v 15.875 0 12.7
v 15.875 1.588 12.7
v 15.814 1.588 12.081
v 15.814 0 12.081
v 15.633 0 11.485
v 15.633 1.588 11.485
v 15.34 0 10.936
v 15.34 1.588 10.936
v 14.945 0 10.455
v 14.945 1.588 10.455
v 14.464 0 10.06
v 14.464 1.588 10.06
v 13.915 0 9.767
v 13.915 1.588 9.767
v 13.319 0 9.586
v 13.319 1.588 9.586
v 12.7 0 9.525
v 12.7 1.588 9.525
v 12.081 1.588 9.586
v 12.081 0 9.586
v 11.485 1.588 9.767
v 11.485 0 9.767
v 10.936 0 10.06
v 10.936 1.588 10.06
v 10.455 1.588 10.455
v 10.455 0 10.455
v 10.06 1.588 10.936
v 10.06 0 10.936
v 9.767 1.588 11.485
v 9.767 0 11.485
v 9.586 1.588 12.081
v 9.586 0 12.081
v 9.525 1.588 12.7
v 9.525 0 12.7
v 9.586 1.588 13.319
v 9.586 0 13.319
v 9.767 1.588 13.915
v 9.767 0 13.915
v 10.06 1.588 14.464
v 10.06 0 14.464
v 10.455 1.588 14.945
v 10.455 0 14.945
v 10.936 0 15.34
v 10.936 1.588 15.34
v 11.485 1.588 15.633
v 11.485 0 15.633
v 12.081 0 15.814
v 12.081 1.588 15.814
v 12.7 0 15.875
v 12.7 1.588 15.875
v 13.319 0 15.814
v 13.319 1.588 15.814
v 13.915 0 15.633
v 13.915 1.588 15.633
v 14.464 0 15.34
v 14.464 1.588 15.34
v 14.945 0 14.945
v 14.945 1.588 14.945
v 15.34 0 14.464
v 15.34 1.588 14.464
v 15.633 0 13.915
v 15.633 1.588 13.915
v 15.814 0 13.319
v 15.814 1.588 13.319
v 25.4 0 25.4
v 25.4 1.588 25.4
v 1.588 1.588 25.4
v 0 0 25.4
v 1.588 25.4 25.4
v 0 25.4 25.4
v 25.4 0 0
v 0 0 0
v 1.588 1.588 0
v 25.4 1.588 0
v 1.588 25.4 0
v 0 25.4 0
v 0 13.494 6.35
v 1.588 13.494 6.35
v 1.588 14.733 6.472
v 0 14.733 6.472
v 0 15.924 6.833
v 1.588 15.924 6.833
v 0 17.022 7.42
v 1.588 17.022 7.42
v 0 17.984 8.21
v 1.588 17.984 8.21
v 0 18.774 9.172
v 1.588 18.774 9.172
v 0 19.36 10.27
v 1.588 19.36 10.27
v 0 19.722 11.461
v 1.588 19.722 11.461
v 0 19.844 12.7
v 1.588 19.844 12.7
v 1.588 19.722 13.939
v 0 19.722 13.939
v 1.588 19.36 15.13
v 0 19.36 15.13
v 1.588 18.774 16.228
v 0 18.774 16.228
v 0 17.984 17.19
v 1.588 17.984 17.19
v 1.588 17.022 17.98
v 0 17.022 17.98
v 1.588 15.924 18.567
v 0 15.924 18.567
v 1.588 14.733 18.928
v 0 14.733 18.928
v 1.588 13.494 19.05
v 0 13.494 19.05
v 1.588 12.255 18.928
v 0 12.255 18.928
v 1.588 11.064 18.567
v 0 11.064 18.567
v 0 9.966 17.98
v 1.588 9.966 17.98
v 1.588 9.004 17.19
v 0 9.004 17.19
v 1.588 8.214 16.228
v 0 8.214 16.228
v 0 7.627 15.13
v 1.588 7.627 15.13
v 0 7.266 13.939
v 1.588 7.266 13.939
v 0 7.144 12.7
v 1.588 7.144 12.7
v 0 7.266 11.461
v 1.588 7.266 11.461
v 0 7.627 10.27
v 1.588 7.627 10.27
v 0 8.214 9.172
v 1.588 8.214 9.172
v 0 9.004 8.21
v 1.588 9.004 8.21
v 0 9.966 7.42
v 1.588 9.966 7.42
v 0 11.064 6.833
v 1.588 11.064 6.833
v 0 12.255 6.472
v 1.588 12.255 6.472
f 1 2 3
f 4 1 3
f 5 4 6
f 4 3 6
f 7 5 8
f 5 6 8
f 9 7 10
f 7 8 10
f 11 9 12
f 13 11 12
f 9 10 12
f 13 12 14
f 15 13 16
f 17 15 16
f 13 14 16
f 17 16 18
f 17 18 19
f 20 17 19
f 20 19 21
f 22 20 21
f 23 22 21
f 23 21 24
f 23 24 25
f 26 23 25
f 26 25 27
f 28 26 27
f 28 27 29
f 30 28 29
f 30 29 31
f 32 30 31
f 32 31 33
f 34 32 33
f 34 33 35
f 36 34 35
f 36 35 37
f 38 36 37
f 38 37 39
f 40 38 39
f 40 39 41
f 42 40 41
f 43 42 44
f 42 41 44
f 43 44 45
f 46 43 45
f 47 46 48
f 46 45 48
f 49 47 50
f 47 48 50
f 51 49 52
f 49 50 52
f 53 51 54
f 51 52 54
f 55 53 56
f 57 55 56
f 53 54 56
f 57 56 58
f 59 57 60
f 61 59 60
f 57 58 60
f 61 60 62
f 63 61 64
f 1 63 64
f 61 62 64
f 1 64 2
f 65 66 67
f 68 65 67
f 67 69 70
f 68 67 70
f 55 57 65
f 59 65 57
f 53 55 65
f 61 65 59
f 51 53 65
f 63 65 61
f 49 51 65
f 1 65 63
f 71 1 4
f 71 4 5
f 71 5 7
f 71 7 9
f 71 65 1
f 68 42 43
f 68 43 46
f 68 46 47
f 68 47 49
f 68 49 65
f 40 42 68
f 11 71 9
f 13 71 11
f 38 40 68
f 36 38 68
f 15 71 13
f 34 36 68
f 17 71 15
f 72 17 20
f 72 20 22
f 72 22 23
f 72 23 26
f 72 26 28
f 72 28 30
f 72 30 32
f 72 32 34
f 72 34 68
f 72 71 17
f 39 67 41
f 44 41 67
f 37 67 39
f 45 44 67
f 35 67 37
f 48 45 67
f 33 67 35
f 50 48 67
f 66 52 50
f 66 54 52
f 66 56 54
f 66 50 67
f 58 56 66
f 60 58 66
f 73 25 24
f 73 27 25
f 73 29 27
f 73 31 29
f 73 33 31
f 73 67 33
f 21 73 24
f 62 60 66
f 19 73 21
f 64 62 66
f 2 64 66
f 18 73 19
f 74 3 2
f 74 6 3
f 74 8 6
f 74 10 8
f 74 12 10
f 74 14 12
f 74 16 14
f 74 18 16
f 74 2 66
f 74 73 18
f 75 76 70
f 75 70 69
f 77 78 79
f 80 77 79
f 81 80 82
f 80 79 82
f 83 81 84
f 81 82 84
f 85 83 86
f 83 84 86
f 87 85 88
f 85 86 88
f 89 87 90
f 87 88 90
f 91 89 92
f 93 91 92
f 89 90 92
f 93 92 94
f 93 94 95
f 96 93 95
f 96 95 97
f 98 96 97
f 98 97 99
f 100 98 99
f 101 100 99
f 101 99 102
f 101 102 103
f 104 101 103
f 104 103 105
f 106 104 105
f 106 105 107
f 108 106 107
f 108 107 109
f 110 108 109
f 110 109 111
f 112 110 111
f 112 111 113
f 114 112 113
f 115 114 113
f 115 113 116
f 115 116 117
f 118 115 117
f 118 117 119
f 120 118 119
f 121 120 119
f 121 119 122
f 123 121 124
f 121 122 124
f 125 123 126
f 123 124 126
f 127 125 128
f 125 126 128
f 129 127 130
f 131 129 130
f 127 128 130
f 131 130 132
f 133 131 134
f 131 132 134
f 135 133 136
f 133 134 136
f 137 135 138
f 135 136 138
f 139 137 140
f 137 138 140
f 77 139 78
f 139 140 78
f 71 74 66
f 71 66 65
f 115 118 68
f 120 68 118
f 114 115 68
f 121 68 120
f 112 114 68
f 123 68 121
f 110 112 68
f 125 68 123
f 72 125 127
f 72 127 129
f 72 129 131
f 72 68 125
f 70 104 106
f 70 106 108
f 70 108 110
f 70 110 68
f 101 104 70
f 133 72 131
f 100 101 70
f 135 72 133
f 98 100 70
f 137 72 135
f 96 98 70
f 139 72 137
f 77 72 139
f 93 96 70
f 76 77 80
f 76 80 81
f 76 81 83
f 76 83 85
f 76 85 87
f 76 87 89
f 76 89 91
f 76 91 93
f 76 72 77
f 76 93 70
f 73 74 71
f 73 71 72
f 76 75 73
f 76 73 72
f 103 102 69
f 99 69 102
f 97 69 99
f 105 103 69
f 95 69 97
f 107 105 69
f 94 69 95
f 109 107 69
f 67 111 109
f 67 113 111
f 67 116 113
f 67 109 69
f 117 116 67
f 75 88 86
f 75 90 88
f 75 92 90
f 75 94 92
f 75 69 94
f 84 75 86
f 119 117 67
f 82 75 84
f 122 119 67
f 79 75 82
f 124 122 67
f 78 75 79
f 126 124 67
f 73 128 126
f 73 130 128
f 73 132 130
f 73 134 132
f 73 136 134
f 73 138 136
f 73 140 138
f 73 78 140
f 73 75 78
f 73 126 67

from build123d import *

# Parameters (mm, degrees)
BOSS_EXTRUDE1_DEPTH = 25.4
SKETCH2_R           = 3.175
CUT_EXTRUDE1_DEPTH  = 25.4
SKETCH3_R           = 6.35
CUT_EXTRUDE2_DEPTH  = 25.4


with BuildPart() as part:
    # Sketch1 → Boss-Extrude1 (new body)
    with BuildSketch(Plane.XY):
        Polygon((0, 0), (0, 25.4), (1.5875, 25.4), (1.5875, 1.5875), (25.4, 1.5875), (25.4, 0), align=None)
    extrude(amount=BOSS_EXTRUDE1_DEPTH)

    # Sketch2 → Cut-Extrude1 (cut)
    with BuildSketch(Plane(origin=(0, 1.5875, 0), x_dir=(1, 0, 0), z_dir=(0, 1, 0))):
        with Locations((12.7, -12.7)):
            Circle(SKETCH2_R)
    extrude(amount=-CUT_EXTRUDE1_DEPTH, mode=Mode.SUBTRACT)

    # Sketch3 → Cut-Extrude2 (cut)
    with BuildSketch(Plane(origin=(1.5875, 0, 0), x_dir=(0, 0, -1), z_dir=(1, 0, 0))):
        with Locations((-12.7, 13.49375)):
            Circle(SKETCH3_R)
    extrude(amount=-CUT_EXTRUDE2_DEPTH, mode=Mode.SUBTRACT)


solid = part.part
